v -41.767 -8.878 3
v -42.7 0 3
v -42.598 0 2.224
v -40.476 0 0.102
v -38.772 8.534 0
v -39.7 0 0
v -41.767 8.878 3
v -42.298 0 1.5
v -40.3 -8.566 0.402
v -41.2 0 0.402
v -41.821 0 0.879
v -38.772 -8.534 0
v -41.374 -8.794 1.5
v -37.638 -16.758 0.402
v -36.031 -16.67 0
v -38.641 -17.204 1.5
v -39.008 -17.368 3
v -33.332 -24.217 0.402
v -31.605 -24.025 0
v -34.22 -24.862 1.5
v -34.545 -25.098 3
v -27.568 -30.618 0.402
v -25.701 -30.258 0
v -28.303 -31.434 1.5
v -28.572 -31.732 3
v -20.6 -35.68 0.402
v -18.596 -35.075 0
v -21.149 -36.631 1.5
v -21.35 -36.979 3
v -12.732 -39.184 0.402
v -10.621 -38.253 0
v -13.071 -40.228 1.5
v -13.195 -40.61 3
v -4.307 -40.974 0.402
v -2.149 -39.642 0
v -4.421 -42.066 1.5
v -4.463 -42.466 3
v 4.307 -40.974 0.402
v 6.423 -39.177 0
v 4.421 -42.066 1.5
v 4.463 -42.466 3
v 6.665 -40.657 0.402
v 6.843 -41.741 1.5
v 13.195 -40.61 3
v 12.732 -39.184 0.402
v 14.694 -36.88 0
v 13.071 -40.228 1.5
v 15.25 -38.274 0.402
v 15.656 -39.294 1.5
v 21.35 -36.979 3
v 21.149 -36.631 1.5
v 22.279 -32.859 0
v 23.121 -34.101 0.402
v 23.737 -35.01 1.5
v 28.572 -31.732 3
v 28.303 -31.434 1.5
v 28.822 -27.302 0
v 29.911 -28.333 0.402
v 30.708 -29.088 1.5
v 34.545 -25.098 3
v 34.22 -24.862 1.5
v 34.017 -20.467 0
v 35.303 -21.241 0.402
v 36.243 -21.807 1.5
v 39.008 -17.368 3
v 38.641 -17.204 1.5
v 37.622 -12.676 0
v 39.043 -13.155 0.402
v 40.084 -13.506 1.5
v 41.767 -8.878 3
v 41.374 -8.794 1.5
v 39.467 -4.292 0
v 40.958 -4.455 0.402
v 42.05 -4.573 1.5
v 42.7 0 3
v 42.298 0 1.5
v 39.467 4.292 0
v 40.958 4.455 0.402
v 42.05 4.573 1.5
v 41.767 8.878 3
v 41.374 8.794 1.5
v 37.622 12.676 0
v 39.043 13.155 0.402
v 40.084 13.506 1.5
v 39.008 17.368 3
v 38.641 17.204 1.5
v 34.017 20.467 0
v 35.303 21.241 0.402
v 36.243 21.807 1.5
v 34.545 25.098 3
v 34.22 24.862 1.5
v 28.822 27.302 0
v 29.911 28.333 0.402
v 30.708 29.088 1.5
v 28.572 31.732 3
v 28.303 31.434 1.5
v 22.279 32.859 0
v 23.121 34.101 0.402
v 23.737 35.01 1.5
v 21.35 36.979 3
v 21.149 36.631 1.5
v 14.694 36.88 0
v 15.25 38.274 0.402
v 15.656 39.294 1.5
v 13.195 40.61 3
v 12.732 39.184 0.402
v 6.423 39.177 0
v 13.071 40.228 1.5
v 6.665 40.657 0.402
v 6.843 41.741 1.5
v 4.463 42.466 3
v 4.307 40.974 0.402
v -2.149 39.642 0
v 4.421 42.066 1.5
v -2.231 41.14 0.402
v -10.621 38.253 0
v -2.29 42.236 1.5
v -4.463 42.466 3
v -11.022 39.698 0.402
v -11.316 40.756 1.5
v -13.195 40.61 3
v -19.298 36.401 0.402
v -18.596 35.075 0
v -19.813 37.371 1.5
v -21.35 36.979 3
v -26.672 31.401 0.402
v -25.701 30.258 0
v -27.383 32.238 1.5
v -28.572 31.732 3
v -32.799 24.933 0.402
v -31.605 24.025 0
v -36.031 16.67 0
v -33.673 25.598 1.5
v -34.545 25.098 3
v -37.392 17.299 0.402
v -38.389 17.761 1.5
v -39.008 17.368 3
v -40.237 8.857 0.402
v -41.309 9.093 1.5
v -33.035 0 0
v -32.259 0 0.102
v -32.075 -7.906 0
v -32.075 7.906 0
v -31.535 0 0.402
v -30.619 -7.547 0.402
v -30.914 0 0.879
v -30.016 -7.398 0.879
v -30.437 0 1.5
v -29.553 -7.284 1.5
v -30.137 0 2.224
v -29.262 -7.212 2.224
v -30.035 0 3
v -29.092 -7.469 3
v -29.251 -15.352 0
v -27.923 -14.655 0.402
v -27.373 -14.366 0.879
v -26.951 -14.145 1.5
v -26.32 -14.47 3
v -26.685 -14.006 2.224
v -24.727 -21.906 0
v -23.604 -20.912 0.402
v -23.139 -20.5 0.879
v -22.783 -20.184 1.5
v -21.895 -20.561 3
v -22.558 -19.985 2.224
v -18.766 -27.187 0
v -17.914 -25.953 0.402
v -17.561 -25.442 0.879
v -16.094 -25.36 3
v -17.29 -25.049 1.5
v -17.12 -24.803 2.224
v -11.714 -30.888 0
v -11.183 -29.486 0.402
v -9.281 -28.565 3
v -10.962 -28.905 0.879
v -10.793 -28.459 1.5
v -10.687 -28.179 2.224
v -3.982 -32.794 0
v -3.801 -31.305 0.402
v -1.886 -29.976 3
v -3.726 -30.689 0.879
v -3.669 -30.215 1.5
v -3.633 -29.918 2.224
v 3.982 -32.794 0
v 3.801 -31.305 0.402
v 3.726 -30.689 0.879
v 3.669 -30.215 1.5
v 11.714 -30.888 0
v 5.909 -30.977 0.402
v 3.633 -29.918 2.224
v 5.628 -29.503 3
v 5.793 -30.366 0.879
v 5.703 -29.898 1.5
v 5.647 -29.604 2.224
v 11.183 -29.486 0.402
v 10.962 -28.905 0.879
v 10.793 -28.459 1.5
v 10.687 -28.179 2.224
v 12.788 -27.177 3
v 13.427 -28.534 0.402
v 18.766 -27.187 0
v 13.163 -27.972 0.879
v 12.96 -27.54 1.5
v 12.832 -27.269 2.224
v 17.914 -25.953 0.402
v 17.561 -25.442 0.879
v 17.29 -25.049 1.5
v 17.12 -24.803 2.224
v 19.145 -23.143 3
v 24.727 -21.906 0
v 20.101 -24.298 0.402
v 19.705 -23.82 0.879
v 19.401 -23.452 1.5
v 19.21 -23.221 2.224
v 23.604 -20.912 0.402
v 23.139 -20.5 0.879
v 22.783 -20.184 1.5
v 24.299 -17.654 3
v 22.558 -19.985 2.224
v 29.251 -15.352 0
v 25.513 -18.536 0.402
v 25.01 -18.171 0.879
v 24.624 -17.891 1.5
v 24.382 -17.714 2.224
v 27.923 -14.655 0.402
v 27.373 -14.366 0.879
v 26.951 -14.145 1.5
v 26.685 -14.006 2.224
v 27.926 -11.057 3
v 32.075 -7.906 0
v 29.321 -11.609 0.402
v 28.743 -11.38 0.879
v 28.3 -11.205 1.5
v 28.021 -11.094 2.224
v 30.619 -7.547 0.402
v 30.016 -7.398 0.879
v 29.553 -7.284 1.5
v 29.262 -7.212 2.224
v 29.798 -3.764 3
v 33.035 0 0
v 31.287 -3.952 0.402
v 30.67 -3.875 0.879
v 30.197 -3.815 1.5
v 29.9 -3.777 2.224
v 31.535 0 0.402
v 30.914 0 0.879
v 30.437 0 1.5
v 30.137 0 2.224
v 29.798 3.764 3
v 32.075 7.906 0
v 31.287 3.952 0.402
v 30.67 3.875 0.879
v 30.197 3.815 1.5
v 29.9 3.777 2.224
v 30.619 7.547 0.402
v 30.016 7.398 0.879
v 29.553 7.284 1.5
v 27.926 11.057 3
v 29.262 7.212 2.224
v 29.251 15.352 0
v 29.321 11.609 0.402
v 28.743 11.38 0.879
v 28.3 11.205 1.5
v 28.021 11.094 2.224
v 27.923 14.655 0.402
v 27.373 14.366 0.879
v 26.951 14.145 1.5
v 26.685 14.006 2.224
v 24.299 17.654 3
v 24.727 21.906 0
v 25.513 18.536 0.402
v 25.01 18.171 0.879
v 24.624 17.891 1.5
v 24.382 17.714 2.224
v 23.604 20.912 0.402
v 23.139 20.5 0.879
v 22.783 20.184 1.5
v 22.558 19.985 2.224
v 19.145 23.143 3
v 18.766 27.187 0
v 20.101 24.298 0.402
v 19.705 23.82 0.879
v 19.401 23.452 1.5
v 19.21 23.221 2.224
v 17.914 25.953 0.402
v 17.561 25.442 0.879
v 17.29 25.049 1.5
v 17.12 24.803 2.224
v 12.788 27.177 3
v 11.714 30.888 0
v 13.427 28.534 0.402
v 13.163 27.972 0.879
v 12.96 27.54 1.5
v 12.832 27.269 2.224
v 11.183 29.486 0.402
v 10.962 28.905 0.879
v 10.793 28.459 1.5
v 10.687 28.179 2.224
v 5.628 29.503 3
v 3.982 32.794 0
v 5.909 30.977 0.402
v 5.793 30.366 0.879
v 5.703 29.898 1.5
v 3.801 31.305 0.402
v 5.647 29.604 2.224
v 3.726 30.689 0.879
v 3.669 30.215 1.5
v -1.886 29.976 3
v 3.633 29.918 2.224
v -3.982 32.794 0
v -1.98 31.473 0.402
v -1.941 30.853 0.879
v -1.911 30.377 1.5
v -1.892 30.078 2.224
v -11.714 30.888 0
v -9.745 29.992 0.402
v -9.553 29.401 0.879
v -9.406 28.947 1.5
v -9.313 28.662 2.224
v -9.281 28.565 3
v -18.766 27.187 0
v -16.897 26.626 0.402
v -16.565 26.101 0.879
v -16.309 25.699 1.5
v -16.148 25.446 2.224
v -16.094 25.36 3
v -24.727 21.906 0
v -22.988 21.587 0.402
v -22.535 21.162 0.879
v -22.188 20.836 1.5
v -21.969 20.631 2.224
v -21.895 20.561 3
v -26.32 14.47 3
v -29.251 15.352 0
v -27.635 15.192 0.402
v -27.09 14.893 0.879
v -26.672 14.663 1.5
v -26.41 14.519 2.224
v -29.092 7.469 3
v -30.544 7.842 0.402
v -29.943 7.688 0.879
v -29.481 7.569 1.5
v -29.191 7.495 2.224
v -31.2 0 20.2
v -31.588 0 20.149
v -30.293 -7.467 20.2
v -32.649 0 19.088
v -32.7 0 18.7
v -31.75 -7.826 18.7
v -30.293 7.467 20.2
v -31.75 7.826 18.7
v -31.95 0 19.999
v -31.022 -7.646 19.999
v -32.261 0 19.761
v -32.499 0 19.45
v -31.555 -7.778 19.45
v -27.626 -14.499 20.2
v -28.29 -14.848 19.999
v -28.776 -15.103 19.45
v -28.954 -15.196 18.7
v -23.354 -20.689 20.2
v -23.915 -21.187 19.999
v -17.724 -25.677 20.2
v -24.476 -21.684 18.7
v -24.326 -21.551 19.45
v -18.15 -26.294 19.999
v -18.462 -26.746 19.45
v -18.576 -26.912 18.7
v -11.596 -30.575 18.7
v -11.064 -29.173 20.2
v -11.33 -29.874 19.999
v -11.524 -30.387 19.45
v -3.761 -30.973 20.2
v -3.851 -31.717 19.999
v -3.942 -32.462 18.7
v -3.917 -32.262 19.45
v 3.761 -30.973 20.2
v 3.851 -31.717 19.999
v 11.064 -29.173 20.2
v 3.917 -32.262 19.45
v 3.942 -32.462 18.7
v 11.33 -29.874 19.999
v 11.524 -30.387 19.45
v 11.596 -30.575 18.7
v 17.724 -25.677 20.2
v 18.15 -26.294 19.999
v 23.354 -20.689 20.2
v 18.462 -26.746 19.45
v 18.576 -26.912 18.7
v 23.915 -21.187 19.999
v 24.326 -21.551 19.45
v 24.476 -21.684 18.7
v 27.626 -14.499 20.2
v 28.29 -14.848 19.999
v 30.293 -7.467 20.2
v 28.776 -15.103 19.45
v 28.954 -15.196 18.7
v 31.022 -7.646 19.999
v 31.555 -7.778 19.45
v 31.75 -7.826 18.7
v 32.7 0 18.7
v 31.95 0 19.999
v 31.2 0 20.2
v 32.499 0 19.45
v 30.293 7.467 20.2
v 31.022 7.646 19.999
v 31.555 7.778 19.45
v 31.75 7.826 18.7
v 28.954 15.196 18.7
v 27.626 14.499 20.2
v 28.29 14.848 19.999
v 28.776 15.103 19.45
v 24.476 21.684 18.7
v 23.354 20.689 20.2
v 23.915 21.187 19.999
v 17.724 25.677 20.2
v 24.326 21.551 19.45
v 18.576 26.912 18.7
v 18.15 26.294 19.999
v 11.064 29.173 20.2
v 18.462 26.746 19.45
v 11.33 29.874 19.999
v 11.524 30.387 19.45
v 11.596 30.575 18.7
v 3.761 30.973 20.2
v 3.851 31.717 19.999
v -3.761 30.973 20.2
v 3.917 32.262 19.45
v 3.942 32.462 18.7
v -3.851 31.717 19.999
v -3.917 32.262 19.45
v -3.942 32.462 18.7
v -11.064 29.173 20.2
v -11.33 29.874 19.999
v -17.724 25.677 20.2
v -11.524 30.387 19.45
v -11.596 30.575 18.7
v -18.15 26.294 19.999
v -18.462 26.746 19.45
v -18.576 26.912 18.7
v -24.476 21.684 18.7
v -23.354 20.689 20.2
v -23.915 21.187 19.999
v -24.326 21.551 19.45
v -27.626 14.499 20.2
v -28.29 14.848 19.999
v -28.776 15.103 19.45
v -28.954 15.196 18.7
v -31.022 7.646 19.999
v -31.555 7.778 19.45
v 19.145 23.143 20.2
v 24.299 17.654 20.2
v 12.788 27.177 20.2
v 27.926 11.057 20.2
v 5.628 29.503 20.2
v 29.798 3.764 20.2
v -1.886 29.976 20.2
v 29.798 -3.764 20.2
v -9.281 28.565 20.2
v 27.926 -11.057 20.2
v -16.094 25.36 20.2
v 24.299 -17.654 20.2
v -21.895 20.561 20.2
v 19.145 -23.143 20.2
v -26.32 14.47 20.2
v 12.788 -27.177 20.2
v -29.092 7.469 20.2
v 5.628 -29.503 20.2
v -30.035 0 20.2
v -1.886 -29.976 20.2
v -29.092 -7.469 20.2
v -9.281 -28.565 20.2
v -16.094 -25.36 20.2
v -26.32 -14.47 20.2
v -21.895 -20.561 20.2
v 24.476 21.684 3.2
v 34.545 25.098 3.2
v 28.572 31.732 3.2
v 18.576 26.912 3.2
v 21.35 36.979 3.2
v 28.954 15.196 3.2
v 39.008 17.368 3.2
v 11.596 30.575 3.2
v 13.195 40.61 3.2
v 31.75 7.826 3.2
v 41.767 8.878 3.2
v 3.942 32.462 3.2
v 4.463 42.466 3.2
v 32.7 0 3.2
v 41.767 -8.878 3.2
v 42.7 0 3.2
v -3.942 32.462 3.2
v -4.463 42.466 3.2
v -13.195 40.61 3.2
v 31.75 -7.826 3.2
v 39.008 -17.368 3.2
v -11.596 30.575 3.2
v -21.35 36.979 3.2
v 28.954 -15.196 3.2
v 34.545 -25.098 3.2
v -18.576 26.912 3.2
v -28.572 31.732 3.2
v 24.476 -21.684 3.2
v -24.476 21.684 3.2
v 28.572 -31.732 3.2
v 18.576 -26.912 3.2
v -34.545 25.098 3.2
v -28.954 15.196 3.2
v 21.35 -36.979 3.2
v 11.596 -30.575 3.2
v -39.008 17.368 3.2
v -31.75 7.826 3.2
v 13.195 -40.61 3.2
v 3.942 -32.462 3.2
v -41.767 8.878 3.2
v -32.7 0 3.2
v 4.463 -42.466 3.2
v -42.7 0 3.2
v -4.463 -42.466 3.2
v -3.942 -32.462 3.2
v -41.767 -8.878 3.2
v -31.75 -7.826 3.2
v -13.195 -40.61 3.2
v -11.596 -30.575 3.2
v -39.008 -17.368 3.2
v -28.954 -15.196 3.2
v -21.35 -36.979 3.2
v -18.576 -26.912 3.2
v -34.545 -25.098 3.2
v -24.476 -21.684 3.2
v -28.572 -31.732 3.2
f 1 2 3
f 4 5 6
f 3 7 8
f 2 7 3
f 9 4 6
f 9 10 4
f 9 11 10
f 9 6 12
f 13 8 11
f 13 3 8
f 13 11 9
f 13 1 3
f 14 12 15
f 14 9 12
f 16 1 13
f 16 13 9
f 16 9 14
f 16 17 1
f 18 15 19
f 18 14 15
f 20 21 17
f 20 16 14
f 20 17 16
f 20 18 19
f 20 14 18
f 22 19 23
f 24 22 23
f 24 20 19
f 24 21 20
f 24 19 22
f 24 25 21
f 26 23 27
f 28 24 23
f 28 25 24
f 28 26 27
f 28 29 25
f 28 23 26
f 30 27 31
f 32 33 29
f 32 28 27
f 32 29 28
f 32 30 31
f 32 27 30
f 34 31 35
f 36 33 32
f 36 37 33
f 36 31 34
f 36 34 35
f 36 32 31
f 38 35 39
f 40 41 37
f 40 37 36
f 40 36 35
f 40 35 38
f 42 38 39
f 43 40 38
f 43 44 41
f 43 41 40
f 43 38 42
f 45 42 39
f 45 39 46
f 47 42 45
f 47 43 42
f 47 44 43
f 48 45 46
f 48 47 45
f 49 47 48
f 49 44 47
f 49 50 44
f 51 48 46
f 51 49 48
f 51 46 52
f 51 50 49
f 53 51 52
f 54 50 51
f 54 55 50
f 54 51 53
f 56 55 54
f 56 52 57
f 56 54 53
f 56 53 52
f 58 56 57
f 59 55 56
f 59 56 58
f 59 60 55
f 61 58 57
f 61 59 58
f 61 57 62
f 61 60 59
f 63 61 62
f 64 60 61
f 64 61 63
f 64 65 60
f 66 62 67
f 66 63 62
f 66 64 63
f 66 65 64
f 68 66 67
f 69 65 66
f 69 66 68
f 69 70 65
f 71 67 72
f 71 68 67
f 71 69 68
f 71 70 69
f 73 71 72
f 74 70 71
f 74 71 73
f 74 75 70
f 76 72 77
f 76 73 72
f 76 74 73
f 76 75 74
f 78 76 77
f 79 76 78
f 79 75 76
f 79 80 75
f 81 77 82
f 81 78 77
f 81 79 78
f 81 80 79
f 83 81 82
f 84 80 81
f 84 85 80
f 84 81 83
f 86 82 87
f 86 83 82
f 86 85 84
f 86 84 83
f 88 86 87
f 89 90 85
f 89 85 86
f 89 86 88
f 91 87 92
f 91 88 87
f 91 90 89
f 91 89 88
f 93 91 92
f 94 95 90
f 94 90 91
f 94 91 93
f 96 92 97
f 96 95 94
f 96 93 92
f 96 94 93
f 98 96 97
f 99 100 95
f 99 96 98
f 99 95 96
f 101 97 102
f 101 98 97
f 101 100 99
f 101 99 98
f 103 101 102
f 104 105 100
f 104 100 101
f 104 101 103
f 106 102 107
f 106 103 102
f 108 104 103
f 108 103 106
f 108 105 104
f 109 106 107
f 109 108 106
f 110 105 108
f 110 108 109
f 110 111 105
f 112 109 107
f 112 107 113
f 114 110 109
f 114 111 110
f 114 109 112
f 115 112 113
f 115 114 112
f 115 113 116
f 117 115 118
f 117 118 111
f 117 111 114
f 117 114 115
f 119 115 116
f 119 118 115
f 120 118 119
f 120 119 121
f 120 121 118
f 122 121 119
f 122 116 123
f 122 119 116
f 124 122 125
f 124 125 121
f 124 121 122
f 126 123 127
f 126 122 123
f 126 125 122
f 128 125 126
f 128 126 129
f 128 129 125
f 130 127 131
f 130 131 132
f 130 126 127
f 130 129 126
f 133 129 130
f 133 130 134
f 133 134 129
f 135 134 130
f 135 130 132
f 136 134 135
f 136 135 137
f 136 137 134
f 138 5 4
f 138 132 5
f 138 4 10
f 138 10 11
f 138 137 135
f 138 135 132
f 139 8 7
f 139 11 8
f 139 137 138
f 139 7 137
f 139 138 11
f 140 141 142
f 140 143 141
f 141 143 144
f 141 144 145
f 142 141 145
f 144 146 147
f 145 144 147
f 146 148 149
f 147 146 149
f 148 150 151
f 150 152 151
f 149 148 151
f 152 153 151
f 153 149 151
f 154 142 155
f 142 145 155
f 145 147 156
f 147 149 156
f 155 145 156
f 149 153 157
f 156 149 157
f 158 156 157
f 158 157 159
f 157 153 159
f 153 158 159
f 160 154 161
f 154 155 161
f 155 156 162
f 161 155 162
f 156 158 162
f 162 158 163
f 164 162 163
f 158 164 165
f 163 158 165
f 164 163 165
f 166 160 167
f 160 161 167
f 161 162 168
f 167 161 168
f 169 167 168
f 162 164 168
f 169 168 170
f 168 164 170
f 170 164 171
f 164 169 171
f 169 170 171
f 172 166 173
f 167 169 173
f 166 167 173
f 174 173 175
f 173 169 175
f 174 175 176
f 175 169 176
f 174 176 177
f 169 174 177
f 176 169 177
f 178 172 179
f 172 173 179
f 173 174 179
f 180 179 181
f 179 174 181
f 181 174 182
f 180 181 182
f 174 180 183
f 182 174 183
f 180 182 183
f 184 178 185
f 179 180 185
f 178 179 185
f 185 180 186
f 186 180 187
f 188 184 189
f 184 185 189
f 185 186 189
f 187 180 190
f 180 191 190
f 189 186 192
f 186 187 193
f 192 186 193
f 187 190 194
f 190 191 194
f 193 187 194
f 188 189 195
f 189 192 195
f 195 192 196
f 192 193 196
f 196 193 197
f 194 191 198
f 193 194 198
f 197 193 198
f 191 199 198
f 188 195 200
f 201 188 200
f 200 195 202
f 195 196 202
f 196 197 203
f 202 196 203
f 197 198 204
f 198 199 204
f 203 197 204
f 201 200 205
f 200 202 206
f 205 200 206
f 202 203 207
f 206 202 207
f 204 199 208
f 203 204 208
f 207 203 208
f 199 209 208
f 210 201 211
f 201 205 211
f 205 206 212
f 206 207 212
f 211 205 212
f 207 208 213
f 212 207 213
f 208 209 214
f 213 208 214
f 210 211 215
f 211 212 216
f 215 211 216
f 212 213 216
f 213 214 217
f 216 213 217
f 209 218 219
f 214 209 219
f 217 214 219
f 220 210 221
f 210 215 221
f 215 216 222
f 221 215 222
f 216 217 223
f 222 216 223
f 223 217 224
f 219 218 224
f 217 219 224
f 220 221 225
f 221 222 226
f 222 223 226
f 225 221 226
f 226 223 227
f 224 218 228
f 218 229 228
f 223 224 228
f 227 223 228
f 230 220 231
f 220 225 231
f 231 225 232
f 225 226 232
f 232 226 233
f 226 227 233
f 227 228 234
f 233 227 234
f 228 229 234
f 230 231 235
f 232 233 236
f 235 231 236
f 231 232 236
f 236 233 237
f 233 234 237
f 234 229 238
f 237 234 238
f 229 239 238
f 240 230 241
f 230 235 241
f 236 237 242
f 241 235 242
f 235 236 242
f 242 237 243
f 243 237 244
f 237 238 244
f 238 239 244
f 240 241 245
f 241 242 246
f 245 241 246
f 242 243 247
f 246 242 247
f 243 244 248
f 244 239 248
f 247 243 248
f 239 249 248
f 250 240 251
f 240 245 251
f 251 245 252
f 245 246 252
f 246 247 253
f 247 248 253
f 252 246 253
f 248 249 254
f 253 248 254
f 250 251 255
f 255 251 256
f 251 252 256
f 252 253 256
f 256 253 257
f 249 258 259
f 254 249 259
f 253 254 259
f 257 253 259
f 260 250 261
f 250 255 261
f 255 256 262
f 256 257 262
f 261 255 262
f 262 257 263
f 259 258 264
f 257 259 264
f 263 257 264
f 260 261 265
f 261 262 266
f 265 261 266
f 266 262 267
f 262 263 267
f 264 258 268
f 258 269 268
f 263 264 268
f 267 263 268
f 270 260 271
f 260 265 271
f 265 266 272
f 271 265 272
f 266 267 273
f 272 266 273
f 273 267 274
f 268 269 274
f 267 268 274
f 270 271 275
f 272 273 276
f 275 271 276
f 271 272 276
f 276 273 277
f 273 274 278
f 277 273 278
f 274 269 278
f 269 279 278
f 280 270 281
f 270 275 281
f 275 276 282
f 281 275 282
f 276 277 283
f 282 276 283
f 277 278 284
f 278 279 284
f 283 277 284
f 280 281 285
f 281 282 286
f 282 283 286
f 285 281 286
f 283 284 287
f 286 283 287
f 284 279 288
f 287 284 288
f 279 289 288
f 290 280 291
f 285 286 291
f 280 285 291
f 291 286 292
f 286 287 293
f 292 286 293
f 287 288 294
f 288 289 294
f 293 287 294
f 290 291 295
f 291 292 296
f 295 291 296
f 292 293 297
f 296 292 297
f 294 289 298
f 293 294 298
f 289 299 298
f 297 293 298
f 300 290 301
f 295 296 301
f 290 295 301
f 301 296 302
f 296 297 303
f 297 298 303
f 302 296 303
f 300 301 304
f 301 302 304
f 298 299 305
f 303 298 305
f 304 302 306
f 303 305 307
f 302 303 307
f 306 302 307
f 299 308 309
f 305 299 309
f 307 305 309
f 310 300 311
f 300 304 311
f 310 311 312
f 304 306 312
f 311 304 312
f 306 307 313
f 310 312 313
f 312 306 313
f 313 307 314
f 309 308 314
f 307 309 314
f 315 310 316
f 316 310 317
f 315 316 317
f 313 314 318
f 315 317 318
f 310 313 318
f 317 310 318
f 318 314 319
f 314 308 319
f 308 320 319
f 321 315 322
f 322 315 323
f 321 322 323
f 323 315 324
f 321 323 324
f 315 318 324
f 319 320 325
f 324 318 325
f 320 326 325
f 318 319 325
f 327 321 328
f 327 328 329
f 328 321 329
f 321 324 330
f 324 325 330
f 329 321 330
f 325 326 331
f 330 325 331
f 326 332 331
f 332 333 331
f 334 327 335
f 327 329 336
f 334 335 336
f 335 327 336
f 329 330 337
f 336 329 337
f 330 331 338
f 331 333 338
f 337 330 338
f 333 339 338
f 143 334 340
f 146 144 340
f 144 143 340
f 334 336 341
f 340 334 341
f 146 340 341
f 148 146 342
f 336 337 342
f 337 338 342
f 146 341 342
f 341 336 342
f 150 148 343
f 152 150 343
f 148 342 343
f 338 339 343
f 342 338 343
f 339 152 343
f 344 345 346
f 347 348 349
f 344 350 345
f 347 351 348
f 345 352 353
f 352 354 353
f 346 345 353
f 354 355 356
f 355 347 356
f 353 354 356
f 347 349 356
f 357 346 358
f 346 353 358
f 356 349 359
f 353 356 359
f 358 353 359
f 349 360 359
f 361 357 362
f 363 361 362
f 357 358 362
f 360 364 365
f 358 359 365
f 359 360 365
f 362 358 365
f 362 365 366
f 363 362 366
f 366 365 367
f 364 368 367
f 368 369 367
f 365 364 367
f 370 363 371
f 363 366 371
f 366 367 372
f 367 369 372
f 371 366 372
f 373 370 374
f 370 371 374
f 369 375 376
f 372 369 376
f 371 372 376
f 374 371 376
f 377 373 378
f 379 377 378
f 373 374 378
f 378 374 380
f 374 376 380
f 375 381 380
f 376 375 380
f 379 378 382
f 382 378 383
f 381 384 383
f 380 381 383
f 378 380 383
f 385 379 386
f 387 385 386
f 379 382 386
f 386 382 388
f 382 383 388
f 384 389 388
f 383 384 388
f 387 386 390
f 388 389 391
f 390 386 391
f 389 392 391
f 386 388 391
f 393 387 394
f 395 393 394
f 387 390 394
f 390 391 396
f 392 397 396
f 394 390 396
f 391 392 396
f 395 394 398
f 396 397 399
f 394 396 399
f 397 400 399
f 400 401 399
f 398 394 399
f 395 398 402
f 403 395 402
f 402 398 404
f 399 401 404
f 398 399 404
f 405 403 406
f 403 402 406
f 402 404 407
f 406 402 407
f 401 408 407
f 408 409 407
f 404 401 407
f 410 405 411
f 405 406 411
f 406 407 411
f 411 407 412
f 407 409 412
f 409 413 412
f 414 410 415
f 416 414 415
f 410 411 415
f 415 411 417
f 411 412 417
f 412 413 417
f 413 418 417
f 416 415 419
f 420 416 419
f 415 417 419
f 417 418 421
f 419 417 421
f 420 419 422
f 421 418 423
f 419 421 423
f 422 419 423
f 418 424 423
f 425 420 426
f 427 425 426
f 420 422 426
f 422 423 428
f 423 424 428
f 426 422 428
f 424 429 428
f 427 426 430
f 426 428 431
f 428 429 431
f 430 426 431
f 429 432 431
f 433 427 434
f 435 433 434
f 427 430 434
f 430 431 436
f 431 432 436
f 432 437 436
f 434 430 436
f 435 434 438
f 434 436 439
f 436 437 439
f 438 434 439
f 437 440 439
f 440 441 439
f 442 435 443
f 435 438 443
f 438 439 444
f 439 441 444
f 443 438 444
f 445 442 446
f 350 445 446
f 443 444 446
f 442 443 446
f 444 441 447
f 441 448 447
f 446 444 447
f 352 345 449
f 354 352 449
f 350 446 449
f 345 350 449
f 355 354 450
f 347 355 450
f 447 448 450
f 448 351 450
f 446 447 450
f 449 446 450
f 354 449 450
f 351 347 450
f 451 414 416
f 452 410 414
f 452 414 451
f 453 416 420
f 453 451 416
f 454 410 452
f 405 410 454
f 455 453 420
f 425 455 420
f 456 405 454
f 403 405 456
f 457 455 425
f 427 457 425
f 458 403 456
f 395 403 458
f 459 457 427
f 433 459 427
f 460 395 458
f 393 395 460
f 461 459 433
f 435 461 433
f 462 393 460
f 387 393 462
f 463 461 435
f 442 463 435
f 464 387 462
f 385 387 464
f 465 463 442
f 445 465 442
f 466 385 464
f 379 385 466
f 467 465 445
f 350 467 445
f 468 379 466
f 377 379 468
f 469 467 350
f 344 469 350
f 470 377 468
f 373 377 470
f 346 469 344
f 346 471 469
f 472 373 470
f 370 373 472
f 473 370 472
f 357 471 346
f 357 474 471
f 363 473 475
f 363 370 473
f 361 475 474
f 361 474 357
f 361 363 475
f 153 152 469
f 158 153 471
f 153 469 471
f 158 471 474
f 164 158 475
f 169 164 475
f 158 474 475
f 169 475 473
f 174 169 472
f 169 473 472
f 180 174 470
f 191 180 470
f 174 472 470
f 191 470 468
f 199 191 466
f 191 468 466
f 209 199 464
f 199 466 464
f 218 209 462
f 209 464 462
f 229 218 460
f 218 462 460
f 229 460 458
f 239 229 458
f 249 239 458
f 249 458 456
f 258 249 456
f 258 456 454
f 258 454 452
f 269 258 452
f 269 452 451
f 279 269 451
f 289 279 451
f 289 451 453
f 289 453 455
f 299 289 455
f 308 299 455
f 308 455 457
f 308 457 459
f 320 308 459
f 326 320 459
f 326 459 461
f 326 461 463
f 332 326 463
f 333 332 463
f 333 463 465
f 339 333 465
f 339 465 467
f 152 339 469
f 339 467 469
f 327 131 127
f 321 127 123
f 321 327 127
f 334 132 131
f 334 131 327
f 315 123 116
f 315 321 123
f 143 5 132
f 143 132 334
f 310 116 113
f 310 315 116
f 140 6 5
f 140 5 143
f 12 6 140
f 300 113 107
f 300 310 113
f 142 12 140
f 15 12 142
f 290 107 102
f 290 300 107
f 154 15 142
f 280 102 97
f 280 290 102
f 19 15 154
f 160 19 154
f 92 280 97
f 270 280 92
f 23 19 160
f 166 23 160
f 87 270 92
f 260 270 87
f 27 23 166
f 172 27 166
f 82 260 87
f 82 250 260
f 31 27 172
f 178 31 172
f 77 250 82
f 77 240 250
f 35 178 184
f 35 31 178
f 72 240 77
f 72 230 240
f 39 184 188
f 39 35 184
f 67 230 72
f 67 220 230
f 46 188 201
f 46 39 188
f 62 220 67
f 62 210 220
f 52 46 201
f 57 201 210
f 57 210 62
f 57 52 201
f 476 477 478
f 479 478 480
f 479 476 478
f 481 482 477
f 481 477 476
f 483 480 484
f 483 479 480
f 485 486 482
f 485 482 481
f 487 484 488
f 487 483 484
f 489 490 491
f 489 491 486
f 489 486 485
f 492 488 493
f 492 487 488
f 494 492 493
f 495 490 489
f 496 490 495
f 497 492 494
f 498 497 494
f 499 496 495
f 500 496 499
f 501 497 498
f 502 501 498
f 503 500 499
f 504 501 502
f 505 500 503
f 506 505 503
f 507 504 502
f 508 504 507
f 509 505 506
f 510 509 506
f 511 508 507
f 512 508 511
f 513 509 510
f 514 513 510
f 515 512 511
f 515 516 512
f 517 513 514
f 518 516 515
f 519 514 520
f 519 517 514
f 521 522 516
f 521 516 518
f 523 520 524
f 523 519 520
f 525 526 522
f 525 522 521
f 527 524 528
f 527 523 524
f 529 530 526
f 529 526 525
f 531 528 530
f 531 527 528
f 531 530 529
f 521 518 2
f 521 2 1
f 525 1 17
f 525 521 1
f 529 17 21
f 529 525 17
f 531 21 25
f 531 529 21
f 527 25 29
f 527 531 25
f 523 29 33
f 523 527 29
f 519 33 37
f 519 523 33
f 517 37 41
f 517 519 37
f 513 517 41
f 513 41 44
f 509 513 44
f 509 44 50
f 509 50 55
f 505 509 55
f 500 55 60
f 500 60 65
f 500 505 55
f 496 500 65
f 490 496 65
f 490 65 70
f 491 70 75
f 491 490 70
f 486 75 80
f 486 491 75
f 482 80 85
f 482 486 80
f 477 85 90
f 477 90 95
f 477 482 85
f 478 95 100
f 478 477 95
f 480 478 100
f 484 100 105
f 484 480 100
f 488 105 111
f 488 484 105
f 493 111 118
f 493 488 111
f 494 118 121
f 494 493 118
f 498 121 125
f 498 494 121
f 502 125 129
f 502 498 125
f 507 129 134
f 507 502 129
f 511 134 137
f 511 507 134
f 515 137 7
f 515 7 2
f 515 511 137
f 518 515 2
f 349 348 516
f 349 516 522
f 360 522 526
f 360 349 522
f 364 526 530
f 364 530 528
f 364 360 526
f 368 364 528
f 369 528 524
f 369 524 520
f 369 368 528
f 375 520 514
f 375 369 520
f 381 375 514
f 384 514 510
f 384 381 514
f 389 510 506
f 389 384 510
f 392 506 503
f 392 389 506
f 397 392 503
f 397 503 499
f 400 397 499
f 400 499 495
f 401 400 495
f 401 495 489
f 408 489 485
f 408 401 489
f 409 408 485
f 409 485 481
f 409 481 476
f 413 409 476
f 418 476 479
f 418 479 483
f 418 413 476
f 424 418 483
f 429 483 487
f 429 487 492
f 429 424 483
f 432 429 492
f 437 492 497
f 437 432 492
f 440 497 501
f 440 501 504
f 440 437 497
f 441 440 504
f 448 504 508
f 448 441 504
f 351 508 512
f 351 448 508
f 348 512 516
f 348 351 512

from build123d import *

# Parameters (mm, degrees)
SKETCH002_R  = 30.035231
POCKET_DEPTH = 24
FILLET_R     = 3
FILLET001_R  = 3
FILLET002_R  = 1.5


with BuildPart() as part:
    # Sketch001 → Revolution (revolve)
    with BuildSketch(Plane.XZ):
        Polygon((-42.7, 0), (-42.7, 3.2), (-32.7, 3.2), (-32.7, 20.2), (0, 20.2), (0, 0), align=None)
    revolve(axis=Axis((0, 0, 0), (0, 0, 1)))

    # Sketch002 (on Face4 of Revolution) → Pocket (cut)
    with BuildSketch(Plane(origin=(0, 0, 20.2), x_dir=(-1, 0, 0), z_dir=(0, 0, 1))):
        Circle(SKETCH002_R)
    extrude(amount=-POCKET_DEPTH, mode=Mode.SUBTRACT)

    # Fillet
    fillet_edges = [part.edges().sort_by_distance(p)[0] for p in [
        (30.035231, 0, 0),
    ]]
    fillet(fillet_edges, radius=FILLET_R)

    # Fillet001
    fillet001_edges = [part.edges().sort_by_distance(p)[0] for p in [
        (42.7, 0, 0),
    ]]
    fillet(fillet001_edges, radius=FILLET001_R)

    # Fillet002
    fillet002_edges = [part.edges().sort_by_distance(p)[0] for p in [
        (32.7, 0, 20.2),
    ]]
    fillet(fillet002_edges, radius=FILLET002_R)


solid = part.part
